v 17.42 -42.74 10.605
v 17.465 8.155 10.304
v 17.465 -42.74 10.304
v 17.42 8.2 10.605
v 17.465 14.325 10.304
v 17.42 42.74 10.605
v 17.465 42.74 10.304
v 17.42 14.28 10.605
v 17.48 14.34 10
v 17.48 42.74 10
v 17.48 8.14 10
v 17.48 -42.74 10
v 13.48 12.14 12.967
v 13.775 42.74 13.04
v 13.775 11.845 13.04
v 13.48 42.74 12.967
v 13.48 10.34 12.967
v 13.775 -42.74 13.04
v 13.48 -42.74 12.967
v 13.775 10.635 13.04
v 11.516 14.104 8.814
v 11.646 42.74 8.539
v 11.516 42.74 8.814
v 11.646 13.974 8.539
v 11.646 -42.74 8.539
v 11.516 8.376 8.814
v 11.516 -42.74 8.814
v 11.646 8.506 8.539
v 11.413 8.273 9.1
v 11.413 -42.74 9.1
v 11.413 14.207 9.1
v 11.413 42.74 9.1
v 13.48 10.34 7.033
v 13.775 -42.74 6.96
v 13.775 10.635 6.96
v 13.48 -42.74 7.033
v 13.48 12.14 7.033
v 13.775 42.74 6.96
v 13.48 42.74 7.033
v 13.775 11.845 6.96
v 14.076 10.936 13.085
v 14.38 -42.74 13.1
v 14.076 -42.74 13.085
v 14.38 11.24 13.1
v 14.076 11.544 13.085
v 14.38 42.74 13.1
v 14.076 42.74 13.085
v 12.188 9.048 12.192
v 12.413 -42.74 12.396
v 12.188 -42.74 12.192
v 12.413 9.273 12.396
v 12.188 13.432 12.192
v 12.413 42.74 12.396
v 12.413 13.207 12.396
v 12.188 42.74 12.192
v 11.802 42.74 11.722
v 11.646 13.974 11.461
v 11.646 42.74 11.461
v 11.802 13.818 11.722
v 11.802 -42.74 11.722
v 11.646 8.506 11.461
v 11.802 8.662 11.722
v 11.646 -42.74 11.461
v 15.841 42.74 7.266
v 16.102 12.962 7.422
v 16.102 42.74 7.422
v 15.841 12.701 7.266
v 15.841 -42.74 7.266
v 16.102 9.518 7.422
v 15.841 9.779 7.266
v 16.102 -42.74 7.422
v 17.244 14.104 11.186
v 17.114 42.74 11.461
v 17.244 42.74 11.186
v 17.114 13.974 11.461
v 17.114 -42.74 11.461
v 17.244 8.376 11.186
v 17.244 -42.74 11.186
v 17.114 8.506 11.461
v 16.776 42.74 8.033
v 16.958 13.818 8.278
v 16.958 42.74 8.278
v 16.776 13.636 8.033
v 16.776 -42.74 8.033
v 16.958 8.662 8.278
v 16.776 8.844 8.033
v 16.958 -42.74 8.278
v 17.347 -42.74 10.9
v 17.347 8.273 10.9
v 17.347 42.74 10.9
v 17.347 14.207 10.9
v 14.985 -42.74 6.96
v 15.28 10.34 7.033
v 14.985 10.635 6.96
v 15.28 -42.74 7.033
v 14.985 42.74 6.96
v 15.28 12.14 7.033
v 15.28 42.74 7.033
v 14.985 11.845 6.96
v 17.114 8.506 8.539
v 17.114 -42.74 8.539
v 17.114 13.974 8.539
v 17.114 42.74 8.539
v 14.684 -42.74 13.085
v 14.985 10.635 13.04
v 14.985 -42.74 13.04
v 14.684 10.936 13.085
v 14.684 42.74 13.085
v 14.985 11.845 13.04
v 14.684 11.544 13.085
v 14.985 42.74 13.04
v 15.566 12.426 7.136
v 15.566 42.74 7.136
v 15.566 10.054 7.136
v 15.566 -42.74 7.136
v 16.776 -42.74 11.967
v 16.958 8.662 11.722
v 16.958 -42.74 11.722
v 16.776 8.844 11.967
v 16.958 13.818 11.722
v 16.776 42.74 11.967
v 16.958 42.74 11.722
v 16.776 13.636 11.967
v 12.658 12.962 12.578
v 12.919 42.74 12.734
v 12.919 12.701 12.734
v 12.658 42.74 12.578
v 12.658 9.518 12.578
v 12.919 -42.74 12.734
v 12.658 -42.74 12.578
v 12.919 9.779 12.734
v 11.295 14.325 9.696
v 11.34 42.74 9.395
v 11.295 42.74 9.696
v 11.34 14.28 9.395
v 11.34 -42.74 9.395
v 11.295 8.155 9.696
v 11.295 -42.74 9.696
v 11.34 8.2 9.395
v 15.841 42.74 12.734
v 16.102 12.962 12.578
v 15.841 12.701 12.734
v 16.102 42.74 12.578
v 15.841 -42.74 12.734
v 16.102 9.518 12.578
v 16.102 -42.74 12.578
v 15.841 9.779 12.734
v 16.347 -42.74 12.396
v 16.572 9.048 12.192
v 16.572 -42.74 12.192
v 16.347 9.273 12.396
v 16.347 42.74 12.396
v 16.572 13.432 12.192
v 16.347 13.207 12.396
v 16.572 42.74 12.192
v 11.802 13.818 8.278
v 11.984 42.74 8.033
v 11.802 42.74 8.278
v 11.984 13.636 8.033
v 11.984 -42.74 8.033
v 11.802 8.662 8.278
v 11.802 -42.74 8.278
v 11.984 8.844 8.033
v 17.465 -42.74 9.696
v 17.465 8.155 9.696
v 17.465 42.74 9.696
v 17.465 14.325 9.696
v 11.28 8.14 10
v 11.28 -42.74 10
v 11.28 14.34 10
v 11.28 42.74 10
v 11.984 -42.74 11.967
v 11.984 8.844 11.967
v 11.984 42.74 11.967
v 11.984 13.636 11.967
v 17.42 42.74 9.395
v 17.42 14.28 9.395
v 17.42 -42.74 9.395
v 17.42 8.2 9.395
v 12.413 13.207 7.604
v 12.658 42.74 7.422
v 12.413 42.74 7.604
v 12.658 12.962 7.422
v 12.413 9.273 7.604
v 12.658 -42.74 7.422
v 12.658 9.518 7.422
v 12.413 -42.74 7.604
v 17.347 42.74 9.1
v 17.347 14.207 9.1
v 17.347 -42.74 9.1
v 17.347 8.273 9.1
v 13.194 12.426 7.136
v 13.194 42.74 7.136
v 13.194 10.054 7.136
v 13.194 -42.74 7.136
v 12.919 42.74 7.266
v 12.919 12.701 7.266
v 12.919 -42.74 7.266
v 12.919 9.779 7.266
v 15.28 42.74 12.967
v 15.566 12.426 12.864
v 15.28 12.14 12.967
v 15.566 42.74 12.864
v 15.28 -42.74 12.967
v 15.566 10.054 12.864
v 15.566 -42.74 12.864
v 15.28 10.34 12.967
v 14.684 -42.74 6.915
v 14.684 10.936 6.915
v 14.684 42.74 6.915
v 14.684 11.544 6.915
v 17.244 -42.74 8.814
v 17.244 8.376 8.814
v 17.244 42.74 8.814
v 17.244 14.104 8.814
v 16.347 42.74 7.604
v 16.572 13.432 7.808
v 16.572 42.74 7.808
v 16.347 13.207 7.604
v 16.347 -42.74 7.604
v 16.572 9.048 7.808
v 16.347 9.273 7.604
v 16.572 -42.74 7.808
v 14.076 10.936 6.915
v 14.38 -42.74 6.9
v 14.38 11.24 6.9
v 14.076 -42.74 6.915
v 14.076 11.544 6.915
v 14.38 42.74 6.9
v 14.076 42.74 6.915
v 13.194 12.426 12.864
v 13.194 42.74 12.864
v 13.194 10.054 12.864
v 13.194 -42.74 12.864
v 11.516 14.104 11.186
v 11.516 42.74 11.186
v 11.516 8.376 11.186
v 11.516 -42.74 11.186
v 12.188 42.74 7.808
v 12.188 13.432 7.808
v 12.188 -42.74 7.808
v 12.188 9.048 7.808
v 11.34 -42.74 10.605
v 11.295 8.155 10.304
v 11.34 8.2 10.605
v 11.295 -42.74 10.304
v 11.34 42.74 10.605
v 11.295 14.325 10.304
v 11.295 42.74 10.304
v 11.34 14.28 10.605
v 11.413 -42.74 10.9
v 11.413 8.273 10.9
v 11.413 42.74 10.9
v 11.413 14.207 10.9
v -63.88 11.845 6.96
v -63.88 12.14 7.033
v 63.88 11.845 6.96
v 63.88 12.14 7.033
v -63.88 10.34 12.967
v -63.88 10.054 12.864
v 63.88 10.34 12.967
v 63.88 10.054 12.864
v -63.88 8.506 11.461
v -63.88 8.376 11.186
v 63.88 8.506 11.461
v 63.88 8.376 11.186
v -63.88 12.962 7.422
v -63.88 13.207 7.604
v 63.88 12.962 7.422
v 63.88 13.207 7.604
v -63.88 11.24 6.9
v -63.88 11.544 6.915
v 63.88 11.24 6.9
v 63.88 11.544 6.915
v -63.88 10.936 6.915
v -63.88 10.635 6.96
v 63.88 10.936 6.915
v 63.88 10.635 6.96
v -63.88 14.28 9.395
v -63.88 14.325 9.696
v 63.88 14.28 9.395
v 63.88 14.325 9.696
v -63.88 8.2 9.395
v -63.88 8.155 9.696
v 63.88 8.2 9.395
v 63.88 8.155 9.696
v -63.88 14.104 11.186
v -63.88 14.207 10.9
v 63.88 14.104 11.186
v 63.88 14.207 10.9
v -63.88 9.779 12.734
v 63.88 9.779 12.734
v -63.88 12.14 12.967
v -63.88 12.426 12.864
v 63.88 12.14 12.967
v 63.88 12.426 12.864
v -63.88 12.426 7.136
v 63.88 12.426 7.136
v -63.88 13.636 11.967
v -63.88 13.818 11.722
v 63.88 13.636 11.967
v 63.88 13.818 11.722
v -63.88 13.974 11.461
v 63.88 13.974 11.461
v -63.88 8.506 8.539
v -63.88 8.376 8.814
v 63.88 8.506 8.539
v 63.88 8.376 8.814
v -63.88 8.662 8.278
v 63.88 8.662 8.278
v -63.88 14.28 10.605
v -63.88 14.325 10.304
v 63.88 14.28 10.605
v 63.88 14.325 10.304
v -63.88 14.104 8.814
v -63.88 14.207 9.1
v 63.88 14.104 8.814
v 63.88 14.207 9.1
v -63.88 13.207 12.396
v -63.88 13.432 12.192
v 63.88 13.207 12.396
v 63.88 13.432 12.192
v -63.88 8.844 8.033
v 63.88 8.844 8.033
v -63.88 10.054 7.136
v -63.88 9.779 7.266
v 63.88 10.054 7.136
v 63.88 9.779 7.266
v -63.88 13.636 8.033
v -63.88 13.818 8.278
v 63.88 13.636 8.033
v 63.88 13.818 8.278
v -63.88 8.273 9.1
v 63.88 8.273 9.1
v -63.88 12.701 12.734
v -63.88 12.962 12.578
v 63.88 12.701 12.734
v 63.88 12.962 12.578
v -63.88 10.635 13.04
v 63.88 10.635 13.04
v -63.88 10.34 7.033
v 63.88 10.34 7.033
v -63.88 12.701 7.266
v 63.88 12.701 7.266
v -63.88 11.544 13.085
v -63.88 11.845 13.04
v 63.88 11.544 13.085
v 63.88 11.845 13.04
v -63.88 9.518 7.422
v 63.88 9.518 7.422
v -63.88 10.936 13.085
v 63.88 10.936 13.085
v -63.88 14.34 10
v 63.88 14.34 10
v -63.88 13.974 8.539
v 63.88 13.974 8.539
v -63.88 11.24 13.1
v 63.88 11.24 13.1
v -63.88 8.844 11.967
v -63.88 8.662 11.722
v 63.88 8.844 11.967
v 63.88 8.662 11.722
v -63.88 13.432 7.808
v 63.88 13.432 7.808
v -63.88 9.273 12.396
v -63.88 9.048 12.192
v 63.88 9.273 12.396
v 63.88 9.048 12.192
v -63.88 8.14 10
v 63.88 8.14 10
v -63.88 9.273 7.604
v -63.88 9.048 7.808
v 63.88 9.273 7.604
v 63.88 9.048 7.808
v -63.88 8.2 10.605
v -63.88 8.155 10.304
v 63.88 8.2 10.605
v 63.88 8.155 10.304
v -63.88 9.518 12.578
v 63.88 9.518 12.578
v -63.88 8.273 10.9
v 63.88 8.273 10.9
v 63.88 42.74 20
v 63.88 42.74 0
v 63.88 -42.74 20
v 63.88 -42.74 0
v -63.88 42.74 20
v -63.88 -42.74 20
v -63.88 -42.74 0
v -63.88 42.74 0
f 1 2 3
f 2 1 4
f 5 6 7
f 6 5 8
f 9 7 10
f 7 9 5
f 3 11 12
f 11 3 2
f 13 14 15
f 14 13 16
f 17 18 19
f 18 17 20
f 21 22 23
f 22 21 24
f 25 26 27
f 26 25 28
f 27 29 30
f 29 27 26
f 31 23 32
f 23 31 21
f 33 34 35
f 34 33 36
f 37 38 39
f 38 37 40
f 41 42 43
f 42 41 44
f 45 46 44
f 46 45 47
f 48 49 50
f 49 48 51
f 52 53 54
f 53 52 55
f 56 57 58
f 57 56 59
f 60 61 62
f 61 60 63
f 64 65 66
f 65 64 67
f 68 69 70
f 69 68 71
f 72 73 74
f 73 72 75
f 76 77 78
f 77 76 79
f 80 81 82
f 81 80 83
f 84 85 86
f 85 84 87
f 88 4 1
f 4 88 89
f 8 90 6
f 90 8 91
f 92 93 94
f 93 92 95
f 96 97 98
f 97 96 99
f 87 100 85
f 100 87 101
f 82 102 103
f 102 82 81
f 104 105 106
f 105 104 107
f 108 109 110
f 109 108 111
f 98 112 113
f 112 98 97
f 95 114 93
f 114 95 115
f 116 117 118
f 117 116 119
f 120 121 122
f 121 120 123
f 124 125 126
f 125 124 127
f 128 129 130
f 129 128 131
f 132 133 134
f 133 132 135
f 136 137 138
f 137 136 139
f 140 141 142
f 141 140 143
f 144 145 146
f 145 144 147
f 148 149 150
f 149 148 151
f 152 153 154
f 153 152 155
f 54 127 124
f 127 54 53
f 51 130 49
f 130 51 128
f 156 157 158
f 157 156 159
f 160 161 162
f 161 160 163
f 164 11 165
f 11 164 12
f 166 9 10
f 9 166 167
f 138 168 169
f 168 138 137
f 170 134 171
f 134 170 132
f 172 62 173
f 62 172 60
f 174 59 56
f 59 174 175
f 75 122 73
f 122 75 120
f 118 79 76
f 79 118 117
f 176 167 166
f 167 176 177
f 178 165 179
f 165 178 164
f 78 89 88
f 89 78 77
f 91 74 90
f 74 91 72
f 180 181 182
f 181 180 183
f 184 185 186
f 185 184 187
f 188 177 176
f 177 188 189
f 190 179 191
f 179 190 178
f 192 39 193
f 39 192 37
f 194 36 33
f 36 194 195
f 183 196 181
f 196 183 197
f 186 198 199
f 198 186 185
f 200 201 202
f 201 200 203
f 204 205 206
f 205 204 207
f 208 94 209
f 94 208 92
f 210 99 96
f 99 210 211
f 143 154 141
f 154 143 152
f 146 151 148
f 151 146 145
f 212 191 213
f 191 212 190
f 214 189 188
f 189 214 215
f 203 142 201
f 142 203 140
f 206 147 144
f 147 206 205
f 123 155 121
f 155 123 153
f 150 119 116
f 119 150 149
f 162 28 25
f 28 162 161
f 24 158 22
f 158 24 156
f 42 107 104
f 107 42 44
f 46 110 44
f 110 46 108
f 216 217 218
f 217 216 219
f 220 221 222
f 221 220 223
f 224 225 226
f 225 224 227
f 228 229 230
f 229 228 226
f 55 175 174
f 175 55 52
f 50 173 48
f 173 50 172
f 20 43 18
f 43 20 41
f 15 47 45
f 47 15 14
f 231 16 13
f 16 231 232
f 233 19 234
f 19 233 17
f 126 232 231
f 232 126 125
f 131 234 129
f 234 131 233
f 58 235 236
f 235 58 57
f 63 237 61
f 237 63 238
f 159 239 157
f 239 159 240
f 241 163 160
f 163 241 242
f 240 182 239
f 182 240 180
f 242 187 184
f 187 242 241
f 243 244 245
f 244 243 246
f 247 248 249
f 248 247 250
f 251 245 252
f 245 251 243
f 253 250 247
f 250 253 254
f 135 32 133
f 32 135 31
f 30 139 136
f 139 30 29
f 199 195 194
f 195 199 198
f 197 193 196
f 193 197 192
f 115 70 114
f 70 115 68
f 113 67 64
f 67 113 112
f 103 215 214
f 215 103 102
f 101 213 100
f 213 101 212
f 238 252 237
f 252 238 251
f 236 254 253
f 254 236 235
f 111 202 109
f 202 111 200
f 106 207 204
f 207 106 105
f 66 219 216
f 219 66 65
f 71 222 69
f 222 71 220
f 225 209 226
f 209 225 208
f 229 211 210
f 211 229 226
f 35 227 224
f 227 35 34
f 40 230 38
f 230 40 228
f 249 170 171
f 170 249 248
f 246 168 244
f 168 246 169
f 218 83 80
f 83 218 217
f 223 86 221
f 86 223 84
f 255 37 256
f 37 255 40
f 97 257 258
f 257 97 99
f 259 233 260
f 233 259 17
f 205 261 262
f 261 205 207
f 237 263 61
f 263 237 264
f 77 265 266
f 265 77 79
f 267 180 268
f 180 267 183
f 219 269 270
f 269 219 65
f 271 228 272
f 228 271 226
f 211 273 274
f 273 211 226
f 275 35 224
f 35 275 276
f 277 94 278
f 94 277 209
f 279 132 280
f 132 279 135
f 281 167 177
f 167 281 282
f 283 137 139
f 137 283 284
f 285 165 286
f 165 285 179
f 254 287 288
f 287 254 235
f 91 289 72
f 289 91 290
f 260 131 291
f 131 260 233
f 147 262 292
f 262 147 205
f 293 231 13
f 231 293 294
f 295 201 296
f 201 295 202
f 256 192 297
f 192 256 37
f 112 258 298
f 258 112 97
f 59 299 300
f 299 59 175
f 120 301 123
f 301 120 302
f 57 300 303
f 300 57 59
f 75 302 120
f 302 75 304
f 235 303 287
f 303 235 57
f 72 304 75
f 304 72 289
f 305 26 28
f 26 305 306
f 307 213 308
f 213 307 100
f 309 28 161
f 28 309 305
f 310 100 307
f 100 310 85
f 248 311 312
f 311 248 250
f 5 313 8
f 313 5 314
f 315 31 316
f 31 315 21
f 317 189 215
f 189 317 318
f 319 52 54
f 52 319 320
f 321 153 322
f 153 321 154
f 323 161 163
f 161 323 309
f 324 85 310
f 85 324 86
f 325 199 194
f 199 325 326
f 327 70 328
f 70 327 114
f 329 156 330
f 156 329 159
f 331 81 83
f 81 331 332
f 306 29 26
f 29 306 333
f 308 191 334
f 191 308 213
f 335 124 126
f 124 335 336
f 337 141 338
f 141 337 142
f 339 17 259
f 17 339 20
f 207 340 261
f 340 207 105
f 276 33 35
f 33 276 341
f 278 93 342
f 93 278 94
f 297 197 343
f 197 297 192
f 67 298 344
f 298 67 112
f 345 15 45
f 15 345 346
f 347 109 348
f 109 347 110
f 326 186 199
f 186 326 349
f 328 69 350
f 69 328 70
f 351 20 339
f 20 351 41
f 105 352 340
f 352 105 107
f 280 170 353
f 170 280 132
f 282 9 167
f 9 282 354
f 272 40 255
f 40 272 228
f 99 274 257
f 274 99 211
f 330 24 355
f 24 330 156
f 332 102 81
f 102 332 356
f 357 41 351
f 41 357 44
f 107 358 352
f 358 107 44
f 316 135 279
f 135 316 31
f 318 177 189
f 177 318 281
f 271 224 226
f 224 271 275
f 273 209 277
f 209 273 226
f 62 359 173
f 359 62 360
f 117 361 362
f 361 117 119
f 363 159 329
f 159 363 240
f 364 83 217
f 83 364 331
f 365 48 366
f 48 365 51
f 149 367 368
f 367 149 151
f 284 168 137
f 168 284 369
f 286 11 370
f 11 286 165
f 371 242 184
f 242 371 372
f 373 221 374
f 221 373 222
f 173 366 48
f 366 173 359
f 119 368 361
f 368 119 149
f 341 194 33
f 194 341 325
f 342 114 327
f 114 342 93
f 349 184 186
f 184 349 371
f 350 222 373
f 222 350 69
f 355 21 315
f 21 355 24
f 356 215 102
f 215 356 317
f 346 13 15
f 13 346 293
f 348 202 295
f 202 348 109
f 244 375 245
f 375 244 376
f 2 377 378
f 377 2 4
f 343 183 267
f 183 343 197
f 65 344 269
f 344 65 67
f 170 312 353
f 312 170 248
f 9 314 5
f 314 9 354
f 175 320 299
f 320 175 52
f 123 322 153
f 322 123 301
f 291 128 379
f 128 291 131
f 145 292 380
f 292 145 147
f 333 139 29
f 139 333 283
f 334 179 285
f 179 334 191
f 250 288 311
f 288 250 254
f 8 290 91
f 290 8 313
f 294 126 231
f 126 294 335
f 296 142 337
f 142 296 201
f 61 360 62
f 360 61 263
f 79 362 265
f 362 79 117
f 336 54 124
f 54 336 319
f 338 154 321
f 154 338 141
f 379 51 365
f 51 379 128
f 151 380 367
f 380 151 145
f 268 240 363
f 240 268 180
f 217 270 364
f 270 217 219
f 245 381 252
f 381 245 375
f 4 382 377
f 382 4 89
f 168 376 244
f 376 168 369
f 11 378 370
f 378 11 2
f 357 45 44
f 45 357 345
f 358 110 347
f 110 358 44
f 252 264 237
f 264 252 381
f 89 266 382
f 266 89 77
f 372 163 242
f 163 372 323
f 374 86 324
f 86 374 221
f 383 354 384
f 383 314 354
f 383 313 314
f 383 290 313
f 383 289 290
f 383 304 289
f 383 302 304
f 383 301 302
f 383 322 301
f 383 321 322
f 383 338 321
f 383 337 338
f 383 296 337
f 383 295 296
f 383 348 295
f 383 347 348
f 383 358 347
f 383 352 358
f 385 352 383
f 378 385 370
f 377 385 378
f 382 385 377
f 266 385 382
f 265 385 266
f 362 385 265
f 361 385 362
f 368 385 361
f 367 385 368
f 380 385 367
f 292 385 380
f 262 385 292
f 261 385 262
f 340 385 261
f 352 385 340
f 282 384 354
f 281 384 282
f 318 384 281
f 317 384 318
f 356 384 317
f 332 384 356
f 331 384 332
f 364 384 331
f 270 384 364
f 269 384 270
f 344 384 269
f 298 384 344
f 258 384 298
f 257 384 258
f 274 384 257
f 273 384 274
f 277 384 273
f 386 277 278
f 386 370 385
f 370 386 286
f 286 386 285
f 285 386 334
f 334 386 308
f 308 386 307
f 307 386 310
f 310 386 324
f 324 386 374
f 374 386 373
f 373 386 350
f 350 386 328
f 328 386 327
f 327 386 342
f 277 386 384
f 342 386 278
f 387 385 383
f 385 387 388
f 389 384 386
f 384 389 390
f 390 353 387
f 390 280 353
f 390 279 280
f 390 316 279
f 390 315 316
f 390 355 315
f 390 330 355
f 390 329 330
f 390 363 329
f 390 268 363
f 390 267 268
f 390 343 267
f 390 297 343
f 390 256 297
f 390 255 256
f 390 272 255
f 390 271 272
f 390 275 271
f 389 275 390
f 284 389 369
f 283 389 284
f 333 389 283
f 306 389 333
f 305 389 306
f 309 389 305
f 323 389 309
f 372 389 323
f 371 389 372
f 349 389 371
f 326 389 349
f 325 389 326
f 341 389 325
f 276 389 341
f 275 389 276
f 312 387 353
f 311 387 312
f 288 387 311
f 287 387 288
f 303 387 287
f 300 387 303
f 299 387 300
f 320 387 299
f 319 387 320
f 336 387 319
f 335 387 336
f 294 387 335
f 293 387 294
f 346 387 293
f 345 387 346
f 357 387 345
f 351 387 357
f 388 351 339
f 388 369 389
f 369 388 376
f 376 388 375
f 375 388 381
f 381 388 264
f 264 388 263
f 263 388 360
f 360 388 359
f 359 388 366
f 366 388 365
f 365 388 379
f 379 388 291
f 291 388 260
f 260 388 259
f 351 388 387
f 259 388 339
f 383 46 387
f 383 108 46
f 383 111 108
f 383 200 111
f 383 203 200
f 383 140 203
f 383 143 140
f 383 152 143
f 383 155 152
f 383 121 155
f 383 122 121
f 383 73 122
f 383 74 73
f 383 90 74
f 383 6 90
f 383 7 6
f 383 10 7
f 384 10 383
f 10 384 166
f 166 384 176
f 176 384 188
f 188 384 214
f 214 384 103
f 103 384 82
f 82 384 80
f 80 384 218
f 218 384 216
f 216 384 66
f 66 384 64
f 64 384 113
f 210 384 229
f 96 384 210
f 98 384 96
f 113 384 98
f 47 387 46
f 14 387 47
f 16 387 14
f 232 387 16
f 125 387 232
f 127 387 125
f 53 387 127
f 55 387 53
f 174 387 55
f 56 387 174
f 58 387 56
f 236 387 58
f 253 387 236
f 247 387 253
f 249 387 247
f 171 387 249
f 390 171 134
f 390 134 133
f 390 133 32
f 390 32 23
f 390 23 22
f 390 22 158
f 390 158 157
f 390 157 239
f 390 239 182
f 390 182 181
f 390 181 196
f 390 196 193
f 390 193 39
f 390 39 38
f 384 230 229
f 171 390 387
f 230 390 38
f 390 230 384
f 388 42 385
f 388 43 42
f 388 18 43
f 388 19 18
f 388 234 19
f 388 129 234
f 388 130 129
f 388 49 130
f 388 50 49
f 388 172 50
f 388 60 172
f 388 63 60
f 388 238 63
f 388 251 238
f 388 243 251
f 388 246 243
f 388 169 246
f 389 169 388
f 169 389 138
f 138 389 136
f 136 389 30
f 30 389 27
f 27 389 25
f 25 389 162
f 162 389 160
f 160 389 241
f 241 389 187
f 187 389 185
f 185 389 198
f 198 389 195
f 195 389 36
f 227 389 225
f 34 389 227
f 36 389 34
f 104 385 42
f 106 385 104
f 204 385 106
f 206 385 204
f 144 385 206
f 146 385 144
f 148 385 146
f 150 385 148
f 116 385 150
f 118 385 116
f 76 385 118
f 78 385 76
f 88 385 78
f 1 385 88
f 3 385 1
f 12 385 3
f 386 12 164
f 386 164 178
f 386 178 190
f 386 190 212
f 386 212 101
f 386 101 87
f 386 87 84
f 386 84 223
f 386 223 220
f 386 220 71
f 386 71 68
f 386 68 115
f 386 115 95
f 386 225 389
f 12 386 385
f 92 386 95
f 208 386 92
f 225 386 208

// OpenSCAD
// Built by bench/smallmodels/features/compiler.py from a list of features.
$fn = 64;
difference() {
  union() {
    translate([0, 0, 0]) translate([-63.88, -42.74, 0]) cube([127.76, 85.48, 20]);
  }
  union() {
    translate([14.38, 11.24, 10]) rotate([0, 0, 0]) rotate([90, 0, 0]) cylinder(d = 6.2, h = 1080, center = true);
    translate([14.38, 11.24, 10]) rotate([0, 0, 0]) rotate([0, 90, 0]) cylinder(d = 6.2, h = 1080, center = true);
  }
}
